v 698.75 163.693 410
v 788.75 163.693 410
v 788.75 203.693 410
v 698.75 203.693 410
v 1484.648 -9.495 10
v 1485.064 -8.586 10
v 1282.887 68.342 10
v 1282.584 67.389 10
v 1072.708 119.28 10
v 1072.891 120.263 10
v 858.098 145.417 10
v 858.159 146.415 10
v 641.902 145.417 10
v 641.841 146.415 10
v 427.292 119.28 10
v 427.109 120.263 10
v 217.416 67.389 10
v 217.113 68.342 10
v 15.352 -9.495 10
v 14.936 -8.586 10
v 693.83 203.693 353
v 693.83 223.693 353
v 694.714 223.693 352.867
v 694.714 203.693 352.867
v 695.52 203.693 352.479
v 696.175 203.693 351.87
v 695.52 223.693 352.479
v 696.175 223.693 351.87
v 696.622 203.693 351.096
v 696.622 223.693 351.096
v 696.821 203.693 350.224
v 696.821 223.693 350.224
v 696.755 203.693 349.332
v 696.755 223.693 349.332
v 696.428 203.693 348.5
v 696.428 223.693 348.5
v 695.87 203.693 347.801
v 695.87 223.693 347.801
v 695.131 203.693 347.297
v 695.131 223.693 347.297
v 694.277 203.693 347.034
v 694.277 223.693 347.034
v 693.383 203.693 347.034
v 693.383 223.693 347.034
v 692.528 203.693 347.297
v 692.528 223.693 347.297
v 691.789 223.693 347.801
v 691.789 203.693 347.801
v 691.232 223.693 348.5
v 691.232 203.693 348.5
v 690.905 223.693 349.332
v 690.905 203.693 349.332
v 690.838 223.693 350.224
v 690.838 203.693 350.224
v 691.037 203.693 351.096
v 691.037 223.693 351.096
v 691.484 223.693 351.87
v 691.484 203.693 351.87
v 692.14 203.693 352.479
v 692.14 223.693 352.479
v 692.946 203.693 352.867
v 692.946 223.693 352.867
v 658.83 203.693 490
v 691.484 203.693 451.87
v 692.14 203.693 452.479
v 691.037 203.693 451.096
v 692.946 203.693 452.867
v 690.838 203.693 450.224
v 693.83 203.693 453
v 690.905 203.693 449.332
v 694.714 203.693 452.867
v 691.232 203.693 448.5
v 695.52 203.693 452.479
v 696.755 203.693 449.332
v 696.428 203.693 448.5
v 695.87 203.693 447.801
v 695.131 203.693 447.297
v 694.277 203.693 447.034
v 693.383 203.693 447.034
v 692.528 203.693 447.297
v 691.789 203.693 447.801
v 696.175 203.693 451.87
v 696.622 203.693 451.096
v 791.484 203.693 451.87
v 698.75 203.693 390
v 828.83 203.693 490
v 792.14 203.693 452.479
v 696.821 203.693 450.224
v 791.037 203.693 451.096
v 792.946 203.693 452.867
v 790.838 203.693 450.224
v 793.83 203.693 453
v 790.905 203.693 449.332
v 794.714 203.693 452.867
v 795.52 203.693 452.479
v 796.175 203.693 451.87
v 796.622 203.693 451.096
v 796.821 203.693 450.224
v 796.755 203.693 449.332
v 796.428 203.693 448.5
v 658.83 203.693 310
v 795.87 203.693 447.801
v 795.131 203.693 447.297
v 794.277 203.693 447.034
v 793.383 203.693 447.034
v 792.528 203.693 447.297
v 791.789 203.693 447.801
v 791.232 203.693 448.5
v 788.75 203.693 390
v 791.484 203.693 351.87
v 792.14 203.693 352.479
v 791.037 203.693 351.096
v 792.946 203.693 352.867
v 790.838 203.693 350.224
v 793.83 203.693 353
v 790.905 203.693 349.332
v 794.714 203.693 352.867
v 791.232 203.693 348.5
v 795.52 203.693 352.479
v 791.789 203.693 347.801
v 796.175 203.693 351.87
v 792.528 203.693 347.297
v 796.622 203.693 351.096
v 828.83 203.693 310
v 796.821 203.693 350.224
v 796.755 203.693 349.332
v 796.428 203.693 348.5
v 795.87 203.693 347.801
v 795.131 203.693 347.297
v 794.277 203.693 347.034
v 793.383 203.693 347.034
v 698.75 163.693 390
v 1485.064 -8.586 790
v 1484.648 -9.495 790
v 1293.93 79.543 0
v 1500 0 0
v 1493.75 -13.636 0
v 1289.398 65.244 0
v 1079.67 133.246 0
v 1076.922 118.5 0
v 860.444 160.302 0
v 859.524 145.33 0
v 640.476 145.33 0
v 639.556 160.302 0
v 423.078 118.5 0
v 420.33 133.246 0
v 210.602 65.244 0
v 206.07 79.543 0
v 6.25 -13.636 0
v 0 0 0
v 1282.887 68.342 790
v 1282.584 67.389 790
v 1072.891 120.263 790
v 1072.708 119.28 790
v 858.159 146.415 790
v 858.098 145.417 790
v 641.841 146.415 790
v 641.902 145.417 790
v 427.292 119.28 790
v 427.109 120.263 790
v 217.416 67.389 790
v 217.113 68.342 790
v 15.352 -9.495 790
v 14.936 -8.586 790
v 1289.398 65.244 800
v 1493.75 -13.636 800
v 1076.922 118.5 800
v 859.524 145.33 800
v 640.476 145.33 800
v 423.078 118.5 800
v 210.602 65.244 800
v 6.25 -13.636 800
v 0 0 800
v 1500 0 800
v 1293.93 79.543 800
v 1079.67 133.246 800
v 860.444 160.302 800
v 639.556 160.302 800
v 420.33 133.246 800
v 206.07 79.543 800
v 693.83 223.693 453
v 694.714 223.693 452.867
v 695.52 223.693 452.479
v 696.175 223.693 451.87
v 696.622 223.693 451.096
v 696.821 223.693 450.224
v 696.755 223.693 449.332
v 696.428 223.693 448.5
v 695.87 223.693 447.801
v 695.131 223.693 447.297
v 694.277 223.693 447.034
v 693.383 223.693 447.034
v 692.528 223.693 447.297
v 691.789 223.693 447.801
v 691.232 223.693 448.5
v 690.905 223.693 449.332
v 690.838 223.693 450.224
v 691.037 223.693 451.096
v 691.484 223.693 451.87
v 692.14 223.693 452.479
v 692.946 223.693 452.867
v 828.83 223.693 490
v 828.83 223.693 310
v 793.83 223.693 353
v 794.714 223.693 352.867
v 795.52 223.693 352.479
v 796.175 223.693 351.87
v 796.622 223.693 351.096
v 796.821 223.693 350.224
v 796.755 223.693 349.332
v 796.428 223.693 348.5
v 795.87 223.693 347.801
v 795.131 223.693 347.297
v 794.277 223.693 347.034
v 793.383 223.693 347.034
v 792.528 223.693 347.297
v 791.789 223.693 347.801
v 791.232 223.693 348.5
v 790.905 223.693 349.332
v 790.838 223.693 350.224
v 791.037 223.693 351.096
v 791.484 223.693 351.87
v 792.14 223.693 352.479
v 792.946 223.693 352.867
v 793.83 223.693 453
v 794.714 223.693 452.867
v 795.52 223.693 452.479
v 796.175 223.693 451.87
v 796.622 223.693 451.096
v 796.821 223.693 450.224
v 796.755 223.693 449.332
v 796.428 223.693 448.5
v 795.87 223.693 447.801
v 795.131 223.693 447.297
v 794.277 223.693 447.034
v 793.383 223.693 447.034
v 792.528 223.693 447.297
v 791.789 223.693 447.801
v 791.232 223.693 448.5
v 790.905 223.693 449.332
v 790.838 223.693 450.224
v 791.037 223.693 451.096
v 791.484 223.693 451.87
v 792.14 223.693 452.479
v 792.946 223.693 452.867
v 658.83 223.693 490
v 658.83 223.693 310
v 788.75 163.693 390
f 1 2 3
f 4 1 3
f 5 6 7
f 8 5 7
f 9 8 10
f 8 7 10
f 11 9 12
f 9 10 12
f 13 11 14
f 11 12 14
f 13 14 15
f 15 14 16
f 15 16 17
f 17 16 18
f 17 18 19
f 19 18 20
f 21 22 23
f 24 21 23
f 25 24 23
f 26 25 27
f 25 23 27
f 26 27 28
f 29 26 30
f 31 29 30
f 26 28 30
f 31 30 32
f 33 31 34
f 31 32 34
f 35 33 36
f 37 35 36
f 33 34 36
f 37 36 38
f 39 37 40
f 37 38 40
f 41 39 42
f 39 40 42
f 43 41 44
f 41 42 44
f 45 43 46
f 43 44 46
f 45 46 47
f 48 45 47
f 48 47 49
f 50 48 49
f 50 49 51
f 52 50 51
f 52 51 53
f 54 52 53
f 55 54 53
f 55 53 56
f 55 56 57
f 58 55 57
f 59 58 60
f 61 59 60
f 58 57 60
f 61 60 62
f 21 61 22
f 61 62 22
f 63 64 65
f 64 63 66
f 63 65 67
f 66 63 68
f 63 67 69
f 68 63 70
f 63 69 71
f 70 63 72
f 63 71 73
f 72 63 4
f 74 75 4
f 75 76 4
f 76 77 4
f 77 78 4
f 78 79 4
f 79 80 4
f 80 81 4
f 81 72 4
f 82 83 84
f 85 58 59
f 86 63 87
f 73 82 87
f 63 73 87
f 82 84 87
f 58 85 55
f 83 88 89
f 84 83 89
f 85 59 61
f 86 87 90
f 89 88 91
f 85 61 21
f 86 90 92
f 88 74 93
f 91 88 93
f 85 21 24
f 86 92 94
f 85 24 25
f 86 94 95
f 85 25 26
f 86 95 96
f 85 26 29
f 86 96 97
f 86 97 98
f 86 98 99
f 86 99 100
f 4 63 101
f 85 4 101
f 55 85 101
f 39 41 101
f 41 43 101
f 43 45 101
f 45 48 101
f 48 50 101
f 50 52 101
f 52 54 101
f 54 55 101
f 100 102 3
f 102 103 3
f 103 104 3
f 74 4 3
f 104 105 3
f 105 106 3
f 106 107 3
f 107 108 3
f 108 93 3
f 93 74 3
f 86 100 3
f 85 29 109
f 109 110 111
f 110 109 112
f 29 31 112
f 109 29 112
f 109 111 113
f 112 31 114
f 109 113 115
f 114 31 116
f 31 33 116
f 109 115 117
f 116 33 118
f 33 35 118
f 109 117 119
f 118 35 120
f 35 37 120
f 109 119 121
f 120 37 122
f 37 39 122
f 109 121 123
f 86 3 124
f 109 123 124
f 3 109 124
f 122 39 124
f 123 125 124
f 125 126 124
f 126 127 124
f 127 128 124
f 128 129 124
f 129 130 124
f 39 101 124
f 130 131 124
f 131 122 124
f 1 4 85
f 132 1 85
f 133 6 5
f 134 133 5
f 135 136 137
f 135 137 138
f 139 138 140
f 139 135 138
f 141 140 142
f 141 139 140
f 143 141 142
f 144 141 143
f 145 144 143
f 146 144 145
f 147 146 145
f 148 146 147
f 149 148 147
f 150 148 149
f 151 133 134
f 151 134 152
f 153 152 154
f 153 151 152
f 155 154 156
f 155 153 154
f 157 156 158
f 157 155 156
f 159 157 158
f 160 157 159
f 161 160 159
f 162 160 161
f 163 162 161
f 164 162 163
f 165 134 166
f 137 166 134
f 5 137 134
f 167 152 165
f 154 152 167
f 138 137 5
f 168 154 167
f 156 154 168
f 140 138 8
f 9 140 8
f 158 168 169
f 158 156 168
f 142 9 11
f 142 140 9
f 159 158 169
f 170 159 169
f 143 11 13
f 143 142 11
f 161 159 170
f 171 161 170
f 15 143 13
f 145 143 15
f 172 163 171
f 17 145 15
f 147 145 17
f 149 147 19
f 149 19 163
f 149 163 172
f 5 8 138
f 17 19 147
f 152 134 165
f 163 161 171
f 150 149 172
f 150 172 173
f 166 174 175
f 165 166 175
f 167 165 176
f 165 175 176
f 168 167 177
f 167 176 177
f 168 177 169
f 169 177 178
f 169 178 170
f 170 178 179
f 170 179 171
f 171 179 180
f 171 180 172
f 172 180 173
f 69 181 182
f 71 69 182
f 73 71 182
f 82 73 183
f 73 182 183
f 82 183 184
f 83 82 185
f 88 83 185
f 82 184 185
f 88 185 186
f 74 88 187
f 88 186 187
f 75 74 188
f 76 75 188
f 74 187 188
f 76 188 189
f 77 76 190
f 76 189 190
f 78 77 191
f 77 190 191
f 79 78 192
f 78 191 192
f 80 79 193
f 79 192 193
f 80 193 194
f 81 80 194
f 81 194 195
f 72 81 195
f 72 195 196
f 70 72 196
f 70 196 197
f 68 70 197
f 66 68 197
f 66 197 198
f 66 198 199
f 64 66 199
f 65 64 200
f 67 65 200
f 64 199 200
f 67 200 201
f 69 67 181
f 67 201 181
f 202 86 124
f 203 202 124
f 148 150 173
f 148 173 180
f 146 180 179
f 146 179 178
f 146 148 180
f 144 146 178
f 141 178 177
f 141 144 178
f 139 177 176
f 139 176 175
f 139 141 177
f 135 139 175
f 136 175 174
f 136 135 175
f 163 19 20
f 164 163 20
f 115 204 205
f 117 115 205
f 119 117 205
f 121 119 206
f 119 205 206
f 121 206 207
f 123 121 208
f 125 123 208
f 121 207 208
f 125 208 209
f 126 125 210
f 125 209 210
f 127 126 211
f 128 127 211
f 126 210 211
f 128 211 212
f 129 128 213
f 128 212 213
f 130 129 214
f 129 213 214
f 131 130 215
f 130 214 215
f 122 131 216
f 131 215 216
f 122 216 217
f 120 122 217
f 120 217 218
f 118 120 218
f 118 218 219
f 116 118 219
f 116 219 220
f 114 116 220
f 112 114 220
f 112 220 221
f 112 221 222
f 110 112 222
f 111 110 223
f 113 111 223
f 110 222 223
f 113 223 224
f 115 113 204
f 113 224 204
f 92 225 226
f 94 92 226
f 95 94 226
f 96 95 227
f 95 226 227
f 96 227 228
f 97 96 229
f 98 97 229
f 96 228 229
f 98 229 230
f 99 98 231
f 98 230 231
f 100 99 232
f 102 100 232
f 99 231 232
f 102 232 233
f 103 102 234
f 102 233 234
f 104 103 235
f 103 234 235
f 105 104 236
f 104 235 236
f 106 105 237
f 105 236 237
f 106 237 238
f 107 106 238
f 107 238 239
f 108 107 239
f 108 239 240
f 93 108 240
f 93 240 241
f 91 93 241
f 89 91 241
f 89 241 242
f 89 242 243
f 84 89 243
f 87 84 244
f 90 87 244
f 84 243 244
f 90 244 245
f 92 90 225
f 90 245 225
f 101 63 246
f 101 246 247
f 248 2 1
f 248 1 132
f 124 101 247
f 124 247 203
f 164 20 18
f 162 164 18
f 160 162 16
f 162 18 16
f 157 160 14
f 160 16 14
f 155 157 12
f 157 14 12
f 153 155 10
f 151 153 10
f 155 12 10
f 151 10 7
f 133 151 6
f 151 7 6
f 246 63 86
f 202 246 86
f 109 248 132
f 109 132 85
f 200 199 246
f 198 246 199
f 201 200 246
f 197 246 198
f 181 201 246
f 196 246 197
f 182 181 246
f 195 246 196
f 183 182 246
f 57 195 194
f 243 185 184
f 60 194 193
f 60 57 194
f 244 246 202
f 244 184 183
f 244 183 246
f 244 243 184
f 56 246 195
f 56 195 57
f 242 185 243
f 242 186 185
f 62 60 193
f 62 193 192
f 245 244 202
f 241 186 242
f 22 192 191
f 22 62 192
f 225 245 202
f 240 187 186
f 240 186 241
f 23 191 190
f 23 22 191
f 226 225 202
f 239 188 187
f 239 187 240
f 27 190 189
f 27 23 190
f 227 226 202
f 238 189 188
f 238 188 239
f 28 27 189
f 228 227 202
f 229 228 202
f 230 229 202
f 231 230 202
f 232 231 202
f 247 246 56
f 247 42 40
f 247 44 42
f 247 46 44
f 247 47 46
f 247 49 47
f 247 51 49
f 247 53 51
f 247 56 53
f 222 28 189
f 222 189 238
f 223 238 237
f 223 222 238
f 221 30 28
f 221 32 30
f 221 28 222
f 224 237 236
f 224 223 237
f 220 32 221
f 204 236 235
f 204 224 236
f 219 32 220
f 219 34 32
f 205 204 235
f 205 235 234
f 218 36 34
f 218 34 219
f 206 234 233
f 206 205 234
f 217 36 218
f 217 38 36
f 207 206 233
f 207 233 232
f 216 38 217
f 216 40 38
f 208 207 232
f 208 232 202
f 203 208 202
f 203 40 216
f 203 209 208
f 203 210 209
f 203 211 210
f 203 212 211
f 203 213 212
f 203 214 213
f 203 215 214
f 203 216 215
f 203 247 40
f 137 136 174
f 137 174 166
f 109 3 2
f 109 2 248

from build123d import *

# Parameters (mm, degrees)
EXTRU_MINCE1_DEPTH      = 800
ENL_V_START             = -790
ENL_V_MAT_EXTRU_1_DEPTH = 780
SKETCH2_W               = 20
SKETCH2_H               = 40
BOSS_EXTRUDE1_DEPTH     = 45
SKETCH3_W               = 170
SKETCH3_H               = 180
BOSS_EXTRUDE2_DEPTH     = 20
SKETCH4_R               = 3
CUT_EXTRUDE1_DEPTH      = 20


with BuildPart() as part:
    # Esquisse1 → Extru.-Mince1 (new body)
    with BuildSketch(Plane.XY):
        with BuildLine():
            ThreePointArc((0, 0), (750, 163.693182805), (1500, 0))
            Line((1500, 0), (1493.75, -13.635890143))
            ThreePointArc((1493.75, -13.635890143), (750, 148.693182805), (6.25, -13.635890143))
            Line((6.25, -13.635890143), (0, 0))
        make_face()
    extrude(amount=EXTRU_MINCE1_DEPTH)

    # Esquisse2 → Enlèv. mat.-Extru.1 (cut)
    with BuildSketch(Plane.XY.offset(800).offset(ENL_V_START)):
        with BuildLine():
            Line((15.352264856, -9.494687524), (14.935591654, -8.585613923))
            ThreePointArc((14.935591654, -8.585613923), (750, 149.693182805), (1485.064408346, -8.585613923))
            Line((1485.064408346, -8.585613923), (1484.647735144, -9.494687524))
            ThreePointArc((1484.647735144, -9.494687524), (750, 148.693182805), (15.352264856, -9.494687524))
        make_face()
    extrude(amount=ENL_V_MAT_EXTRU_1_DEPTH, mode=Mode.SUBTRACT)


with BuildPart() as body_2:
    # Sketch2 → Boss-Extrude1 (new, symmetric)
    with BuildSketch(Plane(origin=(743.75, 0, 0), x_dir=(0, 0, -1), z_dir=(1, 0, 0))):
        with Locations((-400, 183.693182805)):
            Rectangle(SKETCH2_W, SKETCH2_H)
    extrude(amount=BOSS_EXTRUDE1_DEPTH, both=True)

    # Sketch3 → Boss-Extrude2 (add)
    with BuildSketch(Plane(origin=(0, 203.693182805, 0), x_dir=(1, 0, 0), z_dir=(0, 1, 0))):
        with Locations((743.829806204, -400)):
            Rectangle(SKETCH3_W, SKETCH3_H)
    extrude(amount=BOSS_EXTRUDE2_DEPTH)

    # Sketch4 → Cut-Extrude1 (cut)
    with BuildSketch(Plane(origin=(0, 223.693182805, 0), x_dir=(1, 0, 0), z_dir=(0, 1, 0))):
        with Locations(Location((693.829806204, -450, 0), (0, 0, 270))):
            Circle(SKETCH4_R)
        with Locations(Location((793.829806204, -450, 0), (0, 0, 270))):
            Circle(SKETCH4_R)
        with Locations(Location((693.829806204, -350, 0), (0, 0, 270))):
            Circle(SKETCH4_R)
        with Locations(Location((793.829806204, -350, 0), (0, 0, 270))):
            Circle(SKETCH4_R)
    extrude(amount=-CUT_EXTRUDE1_DEPTH, mode=Mode.SUBTRACT)


solid = Compound([part.part, body_2.part])
